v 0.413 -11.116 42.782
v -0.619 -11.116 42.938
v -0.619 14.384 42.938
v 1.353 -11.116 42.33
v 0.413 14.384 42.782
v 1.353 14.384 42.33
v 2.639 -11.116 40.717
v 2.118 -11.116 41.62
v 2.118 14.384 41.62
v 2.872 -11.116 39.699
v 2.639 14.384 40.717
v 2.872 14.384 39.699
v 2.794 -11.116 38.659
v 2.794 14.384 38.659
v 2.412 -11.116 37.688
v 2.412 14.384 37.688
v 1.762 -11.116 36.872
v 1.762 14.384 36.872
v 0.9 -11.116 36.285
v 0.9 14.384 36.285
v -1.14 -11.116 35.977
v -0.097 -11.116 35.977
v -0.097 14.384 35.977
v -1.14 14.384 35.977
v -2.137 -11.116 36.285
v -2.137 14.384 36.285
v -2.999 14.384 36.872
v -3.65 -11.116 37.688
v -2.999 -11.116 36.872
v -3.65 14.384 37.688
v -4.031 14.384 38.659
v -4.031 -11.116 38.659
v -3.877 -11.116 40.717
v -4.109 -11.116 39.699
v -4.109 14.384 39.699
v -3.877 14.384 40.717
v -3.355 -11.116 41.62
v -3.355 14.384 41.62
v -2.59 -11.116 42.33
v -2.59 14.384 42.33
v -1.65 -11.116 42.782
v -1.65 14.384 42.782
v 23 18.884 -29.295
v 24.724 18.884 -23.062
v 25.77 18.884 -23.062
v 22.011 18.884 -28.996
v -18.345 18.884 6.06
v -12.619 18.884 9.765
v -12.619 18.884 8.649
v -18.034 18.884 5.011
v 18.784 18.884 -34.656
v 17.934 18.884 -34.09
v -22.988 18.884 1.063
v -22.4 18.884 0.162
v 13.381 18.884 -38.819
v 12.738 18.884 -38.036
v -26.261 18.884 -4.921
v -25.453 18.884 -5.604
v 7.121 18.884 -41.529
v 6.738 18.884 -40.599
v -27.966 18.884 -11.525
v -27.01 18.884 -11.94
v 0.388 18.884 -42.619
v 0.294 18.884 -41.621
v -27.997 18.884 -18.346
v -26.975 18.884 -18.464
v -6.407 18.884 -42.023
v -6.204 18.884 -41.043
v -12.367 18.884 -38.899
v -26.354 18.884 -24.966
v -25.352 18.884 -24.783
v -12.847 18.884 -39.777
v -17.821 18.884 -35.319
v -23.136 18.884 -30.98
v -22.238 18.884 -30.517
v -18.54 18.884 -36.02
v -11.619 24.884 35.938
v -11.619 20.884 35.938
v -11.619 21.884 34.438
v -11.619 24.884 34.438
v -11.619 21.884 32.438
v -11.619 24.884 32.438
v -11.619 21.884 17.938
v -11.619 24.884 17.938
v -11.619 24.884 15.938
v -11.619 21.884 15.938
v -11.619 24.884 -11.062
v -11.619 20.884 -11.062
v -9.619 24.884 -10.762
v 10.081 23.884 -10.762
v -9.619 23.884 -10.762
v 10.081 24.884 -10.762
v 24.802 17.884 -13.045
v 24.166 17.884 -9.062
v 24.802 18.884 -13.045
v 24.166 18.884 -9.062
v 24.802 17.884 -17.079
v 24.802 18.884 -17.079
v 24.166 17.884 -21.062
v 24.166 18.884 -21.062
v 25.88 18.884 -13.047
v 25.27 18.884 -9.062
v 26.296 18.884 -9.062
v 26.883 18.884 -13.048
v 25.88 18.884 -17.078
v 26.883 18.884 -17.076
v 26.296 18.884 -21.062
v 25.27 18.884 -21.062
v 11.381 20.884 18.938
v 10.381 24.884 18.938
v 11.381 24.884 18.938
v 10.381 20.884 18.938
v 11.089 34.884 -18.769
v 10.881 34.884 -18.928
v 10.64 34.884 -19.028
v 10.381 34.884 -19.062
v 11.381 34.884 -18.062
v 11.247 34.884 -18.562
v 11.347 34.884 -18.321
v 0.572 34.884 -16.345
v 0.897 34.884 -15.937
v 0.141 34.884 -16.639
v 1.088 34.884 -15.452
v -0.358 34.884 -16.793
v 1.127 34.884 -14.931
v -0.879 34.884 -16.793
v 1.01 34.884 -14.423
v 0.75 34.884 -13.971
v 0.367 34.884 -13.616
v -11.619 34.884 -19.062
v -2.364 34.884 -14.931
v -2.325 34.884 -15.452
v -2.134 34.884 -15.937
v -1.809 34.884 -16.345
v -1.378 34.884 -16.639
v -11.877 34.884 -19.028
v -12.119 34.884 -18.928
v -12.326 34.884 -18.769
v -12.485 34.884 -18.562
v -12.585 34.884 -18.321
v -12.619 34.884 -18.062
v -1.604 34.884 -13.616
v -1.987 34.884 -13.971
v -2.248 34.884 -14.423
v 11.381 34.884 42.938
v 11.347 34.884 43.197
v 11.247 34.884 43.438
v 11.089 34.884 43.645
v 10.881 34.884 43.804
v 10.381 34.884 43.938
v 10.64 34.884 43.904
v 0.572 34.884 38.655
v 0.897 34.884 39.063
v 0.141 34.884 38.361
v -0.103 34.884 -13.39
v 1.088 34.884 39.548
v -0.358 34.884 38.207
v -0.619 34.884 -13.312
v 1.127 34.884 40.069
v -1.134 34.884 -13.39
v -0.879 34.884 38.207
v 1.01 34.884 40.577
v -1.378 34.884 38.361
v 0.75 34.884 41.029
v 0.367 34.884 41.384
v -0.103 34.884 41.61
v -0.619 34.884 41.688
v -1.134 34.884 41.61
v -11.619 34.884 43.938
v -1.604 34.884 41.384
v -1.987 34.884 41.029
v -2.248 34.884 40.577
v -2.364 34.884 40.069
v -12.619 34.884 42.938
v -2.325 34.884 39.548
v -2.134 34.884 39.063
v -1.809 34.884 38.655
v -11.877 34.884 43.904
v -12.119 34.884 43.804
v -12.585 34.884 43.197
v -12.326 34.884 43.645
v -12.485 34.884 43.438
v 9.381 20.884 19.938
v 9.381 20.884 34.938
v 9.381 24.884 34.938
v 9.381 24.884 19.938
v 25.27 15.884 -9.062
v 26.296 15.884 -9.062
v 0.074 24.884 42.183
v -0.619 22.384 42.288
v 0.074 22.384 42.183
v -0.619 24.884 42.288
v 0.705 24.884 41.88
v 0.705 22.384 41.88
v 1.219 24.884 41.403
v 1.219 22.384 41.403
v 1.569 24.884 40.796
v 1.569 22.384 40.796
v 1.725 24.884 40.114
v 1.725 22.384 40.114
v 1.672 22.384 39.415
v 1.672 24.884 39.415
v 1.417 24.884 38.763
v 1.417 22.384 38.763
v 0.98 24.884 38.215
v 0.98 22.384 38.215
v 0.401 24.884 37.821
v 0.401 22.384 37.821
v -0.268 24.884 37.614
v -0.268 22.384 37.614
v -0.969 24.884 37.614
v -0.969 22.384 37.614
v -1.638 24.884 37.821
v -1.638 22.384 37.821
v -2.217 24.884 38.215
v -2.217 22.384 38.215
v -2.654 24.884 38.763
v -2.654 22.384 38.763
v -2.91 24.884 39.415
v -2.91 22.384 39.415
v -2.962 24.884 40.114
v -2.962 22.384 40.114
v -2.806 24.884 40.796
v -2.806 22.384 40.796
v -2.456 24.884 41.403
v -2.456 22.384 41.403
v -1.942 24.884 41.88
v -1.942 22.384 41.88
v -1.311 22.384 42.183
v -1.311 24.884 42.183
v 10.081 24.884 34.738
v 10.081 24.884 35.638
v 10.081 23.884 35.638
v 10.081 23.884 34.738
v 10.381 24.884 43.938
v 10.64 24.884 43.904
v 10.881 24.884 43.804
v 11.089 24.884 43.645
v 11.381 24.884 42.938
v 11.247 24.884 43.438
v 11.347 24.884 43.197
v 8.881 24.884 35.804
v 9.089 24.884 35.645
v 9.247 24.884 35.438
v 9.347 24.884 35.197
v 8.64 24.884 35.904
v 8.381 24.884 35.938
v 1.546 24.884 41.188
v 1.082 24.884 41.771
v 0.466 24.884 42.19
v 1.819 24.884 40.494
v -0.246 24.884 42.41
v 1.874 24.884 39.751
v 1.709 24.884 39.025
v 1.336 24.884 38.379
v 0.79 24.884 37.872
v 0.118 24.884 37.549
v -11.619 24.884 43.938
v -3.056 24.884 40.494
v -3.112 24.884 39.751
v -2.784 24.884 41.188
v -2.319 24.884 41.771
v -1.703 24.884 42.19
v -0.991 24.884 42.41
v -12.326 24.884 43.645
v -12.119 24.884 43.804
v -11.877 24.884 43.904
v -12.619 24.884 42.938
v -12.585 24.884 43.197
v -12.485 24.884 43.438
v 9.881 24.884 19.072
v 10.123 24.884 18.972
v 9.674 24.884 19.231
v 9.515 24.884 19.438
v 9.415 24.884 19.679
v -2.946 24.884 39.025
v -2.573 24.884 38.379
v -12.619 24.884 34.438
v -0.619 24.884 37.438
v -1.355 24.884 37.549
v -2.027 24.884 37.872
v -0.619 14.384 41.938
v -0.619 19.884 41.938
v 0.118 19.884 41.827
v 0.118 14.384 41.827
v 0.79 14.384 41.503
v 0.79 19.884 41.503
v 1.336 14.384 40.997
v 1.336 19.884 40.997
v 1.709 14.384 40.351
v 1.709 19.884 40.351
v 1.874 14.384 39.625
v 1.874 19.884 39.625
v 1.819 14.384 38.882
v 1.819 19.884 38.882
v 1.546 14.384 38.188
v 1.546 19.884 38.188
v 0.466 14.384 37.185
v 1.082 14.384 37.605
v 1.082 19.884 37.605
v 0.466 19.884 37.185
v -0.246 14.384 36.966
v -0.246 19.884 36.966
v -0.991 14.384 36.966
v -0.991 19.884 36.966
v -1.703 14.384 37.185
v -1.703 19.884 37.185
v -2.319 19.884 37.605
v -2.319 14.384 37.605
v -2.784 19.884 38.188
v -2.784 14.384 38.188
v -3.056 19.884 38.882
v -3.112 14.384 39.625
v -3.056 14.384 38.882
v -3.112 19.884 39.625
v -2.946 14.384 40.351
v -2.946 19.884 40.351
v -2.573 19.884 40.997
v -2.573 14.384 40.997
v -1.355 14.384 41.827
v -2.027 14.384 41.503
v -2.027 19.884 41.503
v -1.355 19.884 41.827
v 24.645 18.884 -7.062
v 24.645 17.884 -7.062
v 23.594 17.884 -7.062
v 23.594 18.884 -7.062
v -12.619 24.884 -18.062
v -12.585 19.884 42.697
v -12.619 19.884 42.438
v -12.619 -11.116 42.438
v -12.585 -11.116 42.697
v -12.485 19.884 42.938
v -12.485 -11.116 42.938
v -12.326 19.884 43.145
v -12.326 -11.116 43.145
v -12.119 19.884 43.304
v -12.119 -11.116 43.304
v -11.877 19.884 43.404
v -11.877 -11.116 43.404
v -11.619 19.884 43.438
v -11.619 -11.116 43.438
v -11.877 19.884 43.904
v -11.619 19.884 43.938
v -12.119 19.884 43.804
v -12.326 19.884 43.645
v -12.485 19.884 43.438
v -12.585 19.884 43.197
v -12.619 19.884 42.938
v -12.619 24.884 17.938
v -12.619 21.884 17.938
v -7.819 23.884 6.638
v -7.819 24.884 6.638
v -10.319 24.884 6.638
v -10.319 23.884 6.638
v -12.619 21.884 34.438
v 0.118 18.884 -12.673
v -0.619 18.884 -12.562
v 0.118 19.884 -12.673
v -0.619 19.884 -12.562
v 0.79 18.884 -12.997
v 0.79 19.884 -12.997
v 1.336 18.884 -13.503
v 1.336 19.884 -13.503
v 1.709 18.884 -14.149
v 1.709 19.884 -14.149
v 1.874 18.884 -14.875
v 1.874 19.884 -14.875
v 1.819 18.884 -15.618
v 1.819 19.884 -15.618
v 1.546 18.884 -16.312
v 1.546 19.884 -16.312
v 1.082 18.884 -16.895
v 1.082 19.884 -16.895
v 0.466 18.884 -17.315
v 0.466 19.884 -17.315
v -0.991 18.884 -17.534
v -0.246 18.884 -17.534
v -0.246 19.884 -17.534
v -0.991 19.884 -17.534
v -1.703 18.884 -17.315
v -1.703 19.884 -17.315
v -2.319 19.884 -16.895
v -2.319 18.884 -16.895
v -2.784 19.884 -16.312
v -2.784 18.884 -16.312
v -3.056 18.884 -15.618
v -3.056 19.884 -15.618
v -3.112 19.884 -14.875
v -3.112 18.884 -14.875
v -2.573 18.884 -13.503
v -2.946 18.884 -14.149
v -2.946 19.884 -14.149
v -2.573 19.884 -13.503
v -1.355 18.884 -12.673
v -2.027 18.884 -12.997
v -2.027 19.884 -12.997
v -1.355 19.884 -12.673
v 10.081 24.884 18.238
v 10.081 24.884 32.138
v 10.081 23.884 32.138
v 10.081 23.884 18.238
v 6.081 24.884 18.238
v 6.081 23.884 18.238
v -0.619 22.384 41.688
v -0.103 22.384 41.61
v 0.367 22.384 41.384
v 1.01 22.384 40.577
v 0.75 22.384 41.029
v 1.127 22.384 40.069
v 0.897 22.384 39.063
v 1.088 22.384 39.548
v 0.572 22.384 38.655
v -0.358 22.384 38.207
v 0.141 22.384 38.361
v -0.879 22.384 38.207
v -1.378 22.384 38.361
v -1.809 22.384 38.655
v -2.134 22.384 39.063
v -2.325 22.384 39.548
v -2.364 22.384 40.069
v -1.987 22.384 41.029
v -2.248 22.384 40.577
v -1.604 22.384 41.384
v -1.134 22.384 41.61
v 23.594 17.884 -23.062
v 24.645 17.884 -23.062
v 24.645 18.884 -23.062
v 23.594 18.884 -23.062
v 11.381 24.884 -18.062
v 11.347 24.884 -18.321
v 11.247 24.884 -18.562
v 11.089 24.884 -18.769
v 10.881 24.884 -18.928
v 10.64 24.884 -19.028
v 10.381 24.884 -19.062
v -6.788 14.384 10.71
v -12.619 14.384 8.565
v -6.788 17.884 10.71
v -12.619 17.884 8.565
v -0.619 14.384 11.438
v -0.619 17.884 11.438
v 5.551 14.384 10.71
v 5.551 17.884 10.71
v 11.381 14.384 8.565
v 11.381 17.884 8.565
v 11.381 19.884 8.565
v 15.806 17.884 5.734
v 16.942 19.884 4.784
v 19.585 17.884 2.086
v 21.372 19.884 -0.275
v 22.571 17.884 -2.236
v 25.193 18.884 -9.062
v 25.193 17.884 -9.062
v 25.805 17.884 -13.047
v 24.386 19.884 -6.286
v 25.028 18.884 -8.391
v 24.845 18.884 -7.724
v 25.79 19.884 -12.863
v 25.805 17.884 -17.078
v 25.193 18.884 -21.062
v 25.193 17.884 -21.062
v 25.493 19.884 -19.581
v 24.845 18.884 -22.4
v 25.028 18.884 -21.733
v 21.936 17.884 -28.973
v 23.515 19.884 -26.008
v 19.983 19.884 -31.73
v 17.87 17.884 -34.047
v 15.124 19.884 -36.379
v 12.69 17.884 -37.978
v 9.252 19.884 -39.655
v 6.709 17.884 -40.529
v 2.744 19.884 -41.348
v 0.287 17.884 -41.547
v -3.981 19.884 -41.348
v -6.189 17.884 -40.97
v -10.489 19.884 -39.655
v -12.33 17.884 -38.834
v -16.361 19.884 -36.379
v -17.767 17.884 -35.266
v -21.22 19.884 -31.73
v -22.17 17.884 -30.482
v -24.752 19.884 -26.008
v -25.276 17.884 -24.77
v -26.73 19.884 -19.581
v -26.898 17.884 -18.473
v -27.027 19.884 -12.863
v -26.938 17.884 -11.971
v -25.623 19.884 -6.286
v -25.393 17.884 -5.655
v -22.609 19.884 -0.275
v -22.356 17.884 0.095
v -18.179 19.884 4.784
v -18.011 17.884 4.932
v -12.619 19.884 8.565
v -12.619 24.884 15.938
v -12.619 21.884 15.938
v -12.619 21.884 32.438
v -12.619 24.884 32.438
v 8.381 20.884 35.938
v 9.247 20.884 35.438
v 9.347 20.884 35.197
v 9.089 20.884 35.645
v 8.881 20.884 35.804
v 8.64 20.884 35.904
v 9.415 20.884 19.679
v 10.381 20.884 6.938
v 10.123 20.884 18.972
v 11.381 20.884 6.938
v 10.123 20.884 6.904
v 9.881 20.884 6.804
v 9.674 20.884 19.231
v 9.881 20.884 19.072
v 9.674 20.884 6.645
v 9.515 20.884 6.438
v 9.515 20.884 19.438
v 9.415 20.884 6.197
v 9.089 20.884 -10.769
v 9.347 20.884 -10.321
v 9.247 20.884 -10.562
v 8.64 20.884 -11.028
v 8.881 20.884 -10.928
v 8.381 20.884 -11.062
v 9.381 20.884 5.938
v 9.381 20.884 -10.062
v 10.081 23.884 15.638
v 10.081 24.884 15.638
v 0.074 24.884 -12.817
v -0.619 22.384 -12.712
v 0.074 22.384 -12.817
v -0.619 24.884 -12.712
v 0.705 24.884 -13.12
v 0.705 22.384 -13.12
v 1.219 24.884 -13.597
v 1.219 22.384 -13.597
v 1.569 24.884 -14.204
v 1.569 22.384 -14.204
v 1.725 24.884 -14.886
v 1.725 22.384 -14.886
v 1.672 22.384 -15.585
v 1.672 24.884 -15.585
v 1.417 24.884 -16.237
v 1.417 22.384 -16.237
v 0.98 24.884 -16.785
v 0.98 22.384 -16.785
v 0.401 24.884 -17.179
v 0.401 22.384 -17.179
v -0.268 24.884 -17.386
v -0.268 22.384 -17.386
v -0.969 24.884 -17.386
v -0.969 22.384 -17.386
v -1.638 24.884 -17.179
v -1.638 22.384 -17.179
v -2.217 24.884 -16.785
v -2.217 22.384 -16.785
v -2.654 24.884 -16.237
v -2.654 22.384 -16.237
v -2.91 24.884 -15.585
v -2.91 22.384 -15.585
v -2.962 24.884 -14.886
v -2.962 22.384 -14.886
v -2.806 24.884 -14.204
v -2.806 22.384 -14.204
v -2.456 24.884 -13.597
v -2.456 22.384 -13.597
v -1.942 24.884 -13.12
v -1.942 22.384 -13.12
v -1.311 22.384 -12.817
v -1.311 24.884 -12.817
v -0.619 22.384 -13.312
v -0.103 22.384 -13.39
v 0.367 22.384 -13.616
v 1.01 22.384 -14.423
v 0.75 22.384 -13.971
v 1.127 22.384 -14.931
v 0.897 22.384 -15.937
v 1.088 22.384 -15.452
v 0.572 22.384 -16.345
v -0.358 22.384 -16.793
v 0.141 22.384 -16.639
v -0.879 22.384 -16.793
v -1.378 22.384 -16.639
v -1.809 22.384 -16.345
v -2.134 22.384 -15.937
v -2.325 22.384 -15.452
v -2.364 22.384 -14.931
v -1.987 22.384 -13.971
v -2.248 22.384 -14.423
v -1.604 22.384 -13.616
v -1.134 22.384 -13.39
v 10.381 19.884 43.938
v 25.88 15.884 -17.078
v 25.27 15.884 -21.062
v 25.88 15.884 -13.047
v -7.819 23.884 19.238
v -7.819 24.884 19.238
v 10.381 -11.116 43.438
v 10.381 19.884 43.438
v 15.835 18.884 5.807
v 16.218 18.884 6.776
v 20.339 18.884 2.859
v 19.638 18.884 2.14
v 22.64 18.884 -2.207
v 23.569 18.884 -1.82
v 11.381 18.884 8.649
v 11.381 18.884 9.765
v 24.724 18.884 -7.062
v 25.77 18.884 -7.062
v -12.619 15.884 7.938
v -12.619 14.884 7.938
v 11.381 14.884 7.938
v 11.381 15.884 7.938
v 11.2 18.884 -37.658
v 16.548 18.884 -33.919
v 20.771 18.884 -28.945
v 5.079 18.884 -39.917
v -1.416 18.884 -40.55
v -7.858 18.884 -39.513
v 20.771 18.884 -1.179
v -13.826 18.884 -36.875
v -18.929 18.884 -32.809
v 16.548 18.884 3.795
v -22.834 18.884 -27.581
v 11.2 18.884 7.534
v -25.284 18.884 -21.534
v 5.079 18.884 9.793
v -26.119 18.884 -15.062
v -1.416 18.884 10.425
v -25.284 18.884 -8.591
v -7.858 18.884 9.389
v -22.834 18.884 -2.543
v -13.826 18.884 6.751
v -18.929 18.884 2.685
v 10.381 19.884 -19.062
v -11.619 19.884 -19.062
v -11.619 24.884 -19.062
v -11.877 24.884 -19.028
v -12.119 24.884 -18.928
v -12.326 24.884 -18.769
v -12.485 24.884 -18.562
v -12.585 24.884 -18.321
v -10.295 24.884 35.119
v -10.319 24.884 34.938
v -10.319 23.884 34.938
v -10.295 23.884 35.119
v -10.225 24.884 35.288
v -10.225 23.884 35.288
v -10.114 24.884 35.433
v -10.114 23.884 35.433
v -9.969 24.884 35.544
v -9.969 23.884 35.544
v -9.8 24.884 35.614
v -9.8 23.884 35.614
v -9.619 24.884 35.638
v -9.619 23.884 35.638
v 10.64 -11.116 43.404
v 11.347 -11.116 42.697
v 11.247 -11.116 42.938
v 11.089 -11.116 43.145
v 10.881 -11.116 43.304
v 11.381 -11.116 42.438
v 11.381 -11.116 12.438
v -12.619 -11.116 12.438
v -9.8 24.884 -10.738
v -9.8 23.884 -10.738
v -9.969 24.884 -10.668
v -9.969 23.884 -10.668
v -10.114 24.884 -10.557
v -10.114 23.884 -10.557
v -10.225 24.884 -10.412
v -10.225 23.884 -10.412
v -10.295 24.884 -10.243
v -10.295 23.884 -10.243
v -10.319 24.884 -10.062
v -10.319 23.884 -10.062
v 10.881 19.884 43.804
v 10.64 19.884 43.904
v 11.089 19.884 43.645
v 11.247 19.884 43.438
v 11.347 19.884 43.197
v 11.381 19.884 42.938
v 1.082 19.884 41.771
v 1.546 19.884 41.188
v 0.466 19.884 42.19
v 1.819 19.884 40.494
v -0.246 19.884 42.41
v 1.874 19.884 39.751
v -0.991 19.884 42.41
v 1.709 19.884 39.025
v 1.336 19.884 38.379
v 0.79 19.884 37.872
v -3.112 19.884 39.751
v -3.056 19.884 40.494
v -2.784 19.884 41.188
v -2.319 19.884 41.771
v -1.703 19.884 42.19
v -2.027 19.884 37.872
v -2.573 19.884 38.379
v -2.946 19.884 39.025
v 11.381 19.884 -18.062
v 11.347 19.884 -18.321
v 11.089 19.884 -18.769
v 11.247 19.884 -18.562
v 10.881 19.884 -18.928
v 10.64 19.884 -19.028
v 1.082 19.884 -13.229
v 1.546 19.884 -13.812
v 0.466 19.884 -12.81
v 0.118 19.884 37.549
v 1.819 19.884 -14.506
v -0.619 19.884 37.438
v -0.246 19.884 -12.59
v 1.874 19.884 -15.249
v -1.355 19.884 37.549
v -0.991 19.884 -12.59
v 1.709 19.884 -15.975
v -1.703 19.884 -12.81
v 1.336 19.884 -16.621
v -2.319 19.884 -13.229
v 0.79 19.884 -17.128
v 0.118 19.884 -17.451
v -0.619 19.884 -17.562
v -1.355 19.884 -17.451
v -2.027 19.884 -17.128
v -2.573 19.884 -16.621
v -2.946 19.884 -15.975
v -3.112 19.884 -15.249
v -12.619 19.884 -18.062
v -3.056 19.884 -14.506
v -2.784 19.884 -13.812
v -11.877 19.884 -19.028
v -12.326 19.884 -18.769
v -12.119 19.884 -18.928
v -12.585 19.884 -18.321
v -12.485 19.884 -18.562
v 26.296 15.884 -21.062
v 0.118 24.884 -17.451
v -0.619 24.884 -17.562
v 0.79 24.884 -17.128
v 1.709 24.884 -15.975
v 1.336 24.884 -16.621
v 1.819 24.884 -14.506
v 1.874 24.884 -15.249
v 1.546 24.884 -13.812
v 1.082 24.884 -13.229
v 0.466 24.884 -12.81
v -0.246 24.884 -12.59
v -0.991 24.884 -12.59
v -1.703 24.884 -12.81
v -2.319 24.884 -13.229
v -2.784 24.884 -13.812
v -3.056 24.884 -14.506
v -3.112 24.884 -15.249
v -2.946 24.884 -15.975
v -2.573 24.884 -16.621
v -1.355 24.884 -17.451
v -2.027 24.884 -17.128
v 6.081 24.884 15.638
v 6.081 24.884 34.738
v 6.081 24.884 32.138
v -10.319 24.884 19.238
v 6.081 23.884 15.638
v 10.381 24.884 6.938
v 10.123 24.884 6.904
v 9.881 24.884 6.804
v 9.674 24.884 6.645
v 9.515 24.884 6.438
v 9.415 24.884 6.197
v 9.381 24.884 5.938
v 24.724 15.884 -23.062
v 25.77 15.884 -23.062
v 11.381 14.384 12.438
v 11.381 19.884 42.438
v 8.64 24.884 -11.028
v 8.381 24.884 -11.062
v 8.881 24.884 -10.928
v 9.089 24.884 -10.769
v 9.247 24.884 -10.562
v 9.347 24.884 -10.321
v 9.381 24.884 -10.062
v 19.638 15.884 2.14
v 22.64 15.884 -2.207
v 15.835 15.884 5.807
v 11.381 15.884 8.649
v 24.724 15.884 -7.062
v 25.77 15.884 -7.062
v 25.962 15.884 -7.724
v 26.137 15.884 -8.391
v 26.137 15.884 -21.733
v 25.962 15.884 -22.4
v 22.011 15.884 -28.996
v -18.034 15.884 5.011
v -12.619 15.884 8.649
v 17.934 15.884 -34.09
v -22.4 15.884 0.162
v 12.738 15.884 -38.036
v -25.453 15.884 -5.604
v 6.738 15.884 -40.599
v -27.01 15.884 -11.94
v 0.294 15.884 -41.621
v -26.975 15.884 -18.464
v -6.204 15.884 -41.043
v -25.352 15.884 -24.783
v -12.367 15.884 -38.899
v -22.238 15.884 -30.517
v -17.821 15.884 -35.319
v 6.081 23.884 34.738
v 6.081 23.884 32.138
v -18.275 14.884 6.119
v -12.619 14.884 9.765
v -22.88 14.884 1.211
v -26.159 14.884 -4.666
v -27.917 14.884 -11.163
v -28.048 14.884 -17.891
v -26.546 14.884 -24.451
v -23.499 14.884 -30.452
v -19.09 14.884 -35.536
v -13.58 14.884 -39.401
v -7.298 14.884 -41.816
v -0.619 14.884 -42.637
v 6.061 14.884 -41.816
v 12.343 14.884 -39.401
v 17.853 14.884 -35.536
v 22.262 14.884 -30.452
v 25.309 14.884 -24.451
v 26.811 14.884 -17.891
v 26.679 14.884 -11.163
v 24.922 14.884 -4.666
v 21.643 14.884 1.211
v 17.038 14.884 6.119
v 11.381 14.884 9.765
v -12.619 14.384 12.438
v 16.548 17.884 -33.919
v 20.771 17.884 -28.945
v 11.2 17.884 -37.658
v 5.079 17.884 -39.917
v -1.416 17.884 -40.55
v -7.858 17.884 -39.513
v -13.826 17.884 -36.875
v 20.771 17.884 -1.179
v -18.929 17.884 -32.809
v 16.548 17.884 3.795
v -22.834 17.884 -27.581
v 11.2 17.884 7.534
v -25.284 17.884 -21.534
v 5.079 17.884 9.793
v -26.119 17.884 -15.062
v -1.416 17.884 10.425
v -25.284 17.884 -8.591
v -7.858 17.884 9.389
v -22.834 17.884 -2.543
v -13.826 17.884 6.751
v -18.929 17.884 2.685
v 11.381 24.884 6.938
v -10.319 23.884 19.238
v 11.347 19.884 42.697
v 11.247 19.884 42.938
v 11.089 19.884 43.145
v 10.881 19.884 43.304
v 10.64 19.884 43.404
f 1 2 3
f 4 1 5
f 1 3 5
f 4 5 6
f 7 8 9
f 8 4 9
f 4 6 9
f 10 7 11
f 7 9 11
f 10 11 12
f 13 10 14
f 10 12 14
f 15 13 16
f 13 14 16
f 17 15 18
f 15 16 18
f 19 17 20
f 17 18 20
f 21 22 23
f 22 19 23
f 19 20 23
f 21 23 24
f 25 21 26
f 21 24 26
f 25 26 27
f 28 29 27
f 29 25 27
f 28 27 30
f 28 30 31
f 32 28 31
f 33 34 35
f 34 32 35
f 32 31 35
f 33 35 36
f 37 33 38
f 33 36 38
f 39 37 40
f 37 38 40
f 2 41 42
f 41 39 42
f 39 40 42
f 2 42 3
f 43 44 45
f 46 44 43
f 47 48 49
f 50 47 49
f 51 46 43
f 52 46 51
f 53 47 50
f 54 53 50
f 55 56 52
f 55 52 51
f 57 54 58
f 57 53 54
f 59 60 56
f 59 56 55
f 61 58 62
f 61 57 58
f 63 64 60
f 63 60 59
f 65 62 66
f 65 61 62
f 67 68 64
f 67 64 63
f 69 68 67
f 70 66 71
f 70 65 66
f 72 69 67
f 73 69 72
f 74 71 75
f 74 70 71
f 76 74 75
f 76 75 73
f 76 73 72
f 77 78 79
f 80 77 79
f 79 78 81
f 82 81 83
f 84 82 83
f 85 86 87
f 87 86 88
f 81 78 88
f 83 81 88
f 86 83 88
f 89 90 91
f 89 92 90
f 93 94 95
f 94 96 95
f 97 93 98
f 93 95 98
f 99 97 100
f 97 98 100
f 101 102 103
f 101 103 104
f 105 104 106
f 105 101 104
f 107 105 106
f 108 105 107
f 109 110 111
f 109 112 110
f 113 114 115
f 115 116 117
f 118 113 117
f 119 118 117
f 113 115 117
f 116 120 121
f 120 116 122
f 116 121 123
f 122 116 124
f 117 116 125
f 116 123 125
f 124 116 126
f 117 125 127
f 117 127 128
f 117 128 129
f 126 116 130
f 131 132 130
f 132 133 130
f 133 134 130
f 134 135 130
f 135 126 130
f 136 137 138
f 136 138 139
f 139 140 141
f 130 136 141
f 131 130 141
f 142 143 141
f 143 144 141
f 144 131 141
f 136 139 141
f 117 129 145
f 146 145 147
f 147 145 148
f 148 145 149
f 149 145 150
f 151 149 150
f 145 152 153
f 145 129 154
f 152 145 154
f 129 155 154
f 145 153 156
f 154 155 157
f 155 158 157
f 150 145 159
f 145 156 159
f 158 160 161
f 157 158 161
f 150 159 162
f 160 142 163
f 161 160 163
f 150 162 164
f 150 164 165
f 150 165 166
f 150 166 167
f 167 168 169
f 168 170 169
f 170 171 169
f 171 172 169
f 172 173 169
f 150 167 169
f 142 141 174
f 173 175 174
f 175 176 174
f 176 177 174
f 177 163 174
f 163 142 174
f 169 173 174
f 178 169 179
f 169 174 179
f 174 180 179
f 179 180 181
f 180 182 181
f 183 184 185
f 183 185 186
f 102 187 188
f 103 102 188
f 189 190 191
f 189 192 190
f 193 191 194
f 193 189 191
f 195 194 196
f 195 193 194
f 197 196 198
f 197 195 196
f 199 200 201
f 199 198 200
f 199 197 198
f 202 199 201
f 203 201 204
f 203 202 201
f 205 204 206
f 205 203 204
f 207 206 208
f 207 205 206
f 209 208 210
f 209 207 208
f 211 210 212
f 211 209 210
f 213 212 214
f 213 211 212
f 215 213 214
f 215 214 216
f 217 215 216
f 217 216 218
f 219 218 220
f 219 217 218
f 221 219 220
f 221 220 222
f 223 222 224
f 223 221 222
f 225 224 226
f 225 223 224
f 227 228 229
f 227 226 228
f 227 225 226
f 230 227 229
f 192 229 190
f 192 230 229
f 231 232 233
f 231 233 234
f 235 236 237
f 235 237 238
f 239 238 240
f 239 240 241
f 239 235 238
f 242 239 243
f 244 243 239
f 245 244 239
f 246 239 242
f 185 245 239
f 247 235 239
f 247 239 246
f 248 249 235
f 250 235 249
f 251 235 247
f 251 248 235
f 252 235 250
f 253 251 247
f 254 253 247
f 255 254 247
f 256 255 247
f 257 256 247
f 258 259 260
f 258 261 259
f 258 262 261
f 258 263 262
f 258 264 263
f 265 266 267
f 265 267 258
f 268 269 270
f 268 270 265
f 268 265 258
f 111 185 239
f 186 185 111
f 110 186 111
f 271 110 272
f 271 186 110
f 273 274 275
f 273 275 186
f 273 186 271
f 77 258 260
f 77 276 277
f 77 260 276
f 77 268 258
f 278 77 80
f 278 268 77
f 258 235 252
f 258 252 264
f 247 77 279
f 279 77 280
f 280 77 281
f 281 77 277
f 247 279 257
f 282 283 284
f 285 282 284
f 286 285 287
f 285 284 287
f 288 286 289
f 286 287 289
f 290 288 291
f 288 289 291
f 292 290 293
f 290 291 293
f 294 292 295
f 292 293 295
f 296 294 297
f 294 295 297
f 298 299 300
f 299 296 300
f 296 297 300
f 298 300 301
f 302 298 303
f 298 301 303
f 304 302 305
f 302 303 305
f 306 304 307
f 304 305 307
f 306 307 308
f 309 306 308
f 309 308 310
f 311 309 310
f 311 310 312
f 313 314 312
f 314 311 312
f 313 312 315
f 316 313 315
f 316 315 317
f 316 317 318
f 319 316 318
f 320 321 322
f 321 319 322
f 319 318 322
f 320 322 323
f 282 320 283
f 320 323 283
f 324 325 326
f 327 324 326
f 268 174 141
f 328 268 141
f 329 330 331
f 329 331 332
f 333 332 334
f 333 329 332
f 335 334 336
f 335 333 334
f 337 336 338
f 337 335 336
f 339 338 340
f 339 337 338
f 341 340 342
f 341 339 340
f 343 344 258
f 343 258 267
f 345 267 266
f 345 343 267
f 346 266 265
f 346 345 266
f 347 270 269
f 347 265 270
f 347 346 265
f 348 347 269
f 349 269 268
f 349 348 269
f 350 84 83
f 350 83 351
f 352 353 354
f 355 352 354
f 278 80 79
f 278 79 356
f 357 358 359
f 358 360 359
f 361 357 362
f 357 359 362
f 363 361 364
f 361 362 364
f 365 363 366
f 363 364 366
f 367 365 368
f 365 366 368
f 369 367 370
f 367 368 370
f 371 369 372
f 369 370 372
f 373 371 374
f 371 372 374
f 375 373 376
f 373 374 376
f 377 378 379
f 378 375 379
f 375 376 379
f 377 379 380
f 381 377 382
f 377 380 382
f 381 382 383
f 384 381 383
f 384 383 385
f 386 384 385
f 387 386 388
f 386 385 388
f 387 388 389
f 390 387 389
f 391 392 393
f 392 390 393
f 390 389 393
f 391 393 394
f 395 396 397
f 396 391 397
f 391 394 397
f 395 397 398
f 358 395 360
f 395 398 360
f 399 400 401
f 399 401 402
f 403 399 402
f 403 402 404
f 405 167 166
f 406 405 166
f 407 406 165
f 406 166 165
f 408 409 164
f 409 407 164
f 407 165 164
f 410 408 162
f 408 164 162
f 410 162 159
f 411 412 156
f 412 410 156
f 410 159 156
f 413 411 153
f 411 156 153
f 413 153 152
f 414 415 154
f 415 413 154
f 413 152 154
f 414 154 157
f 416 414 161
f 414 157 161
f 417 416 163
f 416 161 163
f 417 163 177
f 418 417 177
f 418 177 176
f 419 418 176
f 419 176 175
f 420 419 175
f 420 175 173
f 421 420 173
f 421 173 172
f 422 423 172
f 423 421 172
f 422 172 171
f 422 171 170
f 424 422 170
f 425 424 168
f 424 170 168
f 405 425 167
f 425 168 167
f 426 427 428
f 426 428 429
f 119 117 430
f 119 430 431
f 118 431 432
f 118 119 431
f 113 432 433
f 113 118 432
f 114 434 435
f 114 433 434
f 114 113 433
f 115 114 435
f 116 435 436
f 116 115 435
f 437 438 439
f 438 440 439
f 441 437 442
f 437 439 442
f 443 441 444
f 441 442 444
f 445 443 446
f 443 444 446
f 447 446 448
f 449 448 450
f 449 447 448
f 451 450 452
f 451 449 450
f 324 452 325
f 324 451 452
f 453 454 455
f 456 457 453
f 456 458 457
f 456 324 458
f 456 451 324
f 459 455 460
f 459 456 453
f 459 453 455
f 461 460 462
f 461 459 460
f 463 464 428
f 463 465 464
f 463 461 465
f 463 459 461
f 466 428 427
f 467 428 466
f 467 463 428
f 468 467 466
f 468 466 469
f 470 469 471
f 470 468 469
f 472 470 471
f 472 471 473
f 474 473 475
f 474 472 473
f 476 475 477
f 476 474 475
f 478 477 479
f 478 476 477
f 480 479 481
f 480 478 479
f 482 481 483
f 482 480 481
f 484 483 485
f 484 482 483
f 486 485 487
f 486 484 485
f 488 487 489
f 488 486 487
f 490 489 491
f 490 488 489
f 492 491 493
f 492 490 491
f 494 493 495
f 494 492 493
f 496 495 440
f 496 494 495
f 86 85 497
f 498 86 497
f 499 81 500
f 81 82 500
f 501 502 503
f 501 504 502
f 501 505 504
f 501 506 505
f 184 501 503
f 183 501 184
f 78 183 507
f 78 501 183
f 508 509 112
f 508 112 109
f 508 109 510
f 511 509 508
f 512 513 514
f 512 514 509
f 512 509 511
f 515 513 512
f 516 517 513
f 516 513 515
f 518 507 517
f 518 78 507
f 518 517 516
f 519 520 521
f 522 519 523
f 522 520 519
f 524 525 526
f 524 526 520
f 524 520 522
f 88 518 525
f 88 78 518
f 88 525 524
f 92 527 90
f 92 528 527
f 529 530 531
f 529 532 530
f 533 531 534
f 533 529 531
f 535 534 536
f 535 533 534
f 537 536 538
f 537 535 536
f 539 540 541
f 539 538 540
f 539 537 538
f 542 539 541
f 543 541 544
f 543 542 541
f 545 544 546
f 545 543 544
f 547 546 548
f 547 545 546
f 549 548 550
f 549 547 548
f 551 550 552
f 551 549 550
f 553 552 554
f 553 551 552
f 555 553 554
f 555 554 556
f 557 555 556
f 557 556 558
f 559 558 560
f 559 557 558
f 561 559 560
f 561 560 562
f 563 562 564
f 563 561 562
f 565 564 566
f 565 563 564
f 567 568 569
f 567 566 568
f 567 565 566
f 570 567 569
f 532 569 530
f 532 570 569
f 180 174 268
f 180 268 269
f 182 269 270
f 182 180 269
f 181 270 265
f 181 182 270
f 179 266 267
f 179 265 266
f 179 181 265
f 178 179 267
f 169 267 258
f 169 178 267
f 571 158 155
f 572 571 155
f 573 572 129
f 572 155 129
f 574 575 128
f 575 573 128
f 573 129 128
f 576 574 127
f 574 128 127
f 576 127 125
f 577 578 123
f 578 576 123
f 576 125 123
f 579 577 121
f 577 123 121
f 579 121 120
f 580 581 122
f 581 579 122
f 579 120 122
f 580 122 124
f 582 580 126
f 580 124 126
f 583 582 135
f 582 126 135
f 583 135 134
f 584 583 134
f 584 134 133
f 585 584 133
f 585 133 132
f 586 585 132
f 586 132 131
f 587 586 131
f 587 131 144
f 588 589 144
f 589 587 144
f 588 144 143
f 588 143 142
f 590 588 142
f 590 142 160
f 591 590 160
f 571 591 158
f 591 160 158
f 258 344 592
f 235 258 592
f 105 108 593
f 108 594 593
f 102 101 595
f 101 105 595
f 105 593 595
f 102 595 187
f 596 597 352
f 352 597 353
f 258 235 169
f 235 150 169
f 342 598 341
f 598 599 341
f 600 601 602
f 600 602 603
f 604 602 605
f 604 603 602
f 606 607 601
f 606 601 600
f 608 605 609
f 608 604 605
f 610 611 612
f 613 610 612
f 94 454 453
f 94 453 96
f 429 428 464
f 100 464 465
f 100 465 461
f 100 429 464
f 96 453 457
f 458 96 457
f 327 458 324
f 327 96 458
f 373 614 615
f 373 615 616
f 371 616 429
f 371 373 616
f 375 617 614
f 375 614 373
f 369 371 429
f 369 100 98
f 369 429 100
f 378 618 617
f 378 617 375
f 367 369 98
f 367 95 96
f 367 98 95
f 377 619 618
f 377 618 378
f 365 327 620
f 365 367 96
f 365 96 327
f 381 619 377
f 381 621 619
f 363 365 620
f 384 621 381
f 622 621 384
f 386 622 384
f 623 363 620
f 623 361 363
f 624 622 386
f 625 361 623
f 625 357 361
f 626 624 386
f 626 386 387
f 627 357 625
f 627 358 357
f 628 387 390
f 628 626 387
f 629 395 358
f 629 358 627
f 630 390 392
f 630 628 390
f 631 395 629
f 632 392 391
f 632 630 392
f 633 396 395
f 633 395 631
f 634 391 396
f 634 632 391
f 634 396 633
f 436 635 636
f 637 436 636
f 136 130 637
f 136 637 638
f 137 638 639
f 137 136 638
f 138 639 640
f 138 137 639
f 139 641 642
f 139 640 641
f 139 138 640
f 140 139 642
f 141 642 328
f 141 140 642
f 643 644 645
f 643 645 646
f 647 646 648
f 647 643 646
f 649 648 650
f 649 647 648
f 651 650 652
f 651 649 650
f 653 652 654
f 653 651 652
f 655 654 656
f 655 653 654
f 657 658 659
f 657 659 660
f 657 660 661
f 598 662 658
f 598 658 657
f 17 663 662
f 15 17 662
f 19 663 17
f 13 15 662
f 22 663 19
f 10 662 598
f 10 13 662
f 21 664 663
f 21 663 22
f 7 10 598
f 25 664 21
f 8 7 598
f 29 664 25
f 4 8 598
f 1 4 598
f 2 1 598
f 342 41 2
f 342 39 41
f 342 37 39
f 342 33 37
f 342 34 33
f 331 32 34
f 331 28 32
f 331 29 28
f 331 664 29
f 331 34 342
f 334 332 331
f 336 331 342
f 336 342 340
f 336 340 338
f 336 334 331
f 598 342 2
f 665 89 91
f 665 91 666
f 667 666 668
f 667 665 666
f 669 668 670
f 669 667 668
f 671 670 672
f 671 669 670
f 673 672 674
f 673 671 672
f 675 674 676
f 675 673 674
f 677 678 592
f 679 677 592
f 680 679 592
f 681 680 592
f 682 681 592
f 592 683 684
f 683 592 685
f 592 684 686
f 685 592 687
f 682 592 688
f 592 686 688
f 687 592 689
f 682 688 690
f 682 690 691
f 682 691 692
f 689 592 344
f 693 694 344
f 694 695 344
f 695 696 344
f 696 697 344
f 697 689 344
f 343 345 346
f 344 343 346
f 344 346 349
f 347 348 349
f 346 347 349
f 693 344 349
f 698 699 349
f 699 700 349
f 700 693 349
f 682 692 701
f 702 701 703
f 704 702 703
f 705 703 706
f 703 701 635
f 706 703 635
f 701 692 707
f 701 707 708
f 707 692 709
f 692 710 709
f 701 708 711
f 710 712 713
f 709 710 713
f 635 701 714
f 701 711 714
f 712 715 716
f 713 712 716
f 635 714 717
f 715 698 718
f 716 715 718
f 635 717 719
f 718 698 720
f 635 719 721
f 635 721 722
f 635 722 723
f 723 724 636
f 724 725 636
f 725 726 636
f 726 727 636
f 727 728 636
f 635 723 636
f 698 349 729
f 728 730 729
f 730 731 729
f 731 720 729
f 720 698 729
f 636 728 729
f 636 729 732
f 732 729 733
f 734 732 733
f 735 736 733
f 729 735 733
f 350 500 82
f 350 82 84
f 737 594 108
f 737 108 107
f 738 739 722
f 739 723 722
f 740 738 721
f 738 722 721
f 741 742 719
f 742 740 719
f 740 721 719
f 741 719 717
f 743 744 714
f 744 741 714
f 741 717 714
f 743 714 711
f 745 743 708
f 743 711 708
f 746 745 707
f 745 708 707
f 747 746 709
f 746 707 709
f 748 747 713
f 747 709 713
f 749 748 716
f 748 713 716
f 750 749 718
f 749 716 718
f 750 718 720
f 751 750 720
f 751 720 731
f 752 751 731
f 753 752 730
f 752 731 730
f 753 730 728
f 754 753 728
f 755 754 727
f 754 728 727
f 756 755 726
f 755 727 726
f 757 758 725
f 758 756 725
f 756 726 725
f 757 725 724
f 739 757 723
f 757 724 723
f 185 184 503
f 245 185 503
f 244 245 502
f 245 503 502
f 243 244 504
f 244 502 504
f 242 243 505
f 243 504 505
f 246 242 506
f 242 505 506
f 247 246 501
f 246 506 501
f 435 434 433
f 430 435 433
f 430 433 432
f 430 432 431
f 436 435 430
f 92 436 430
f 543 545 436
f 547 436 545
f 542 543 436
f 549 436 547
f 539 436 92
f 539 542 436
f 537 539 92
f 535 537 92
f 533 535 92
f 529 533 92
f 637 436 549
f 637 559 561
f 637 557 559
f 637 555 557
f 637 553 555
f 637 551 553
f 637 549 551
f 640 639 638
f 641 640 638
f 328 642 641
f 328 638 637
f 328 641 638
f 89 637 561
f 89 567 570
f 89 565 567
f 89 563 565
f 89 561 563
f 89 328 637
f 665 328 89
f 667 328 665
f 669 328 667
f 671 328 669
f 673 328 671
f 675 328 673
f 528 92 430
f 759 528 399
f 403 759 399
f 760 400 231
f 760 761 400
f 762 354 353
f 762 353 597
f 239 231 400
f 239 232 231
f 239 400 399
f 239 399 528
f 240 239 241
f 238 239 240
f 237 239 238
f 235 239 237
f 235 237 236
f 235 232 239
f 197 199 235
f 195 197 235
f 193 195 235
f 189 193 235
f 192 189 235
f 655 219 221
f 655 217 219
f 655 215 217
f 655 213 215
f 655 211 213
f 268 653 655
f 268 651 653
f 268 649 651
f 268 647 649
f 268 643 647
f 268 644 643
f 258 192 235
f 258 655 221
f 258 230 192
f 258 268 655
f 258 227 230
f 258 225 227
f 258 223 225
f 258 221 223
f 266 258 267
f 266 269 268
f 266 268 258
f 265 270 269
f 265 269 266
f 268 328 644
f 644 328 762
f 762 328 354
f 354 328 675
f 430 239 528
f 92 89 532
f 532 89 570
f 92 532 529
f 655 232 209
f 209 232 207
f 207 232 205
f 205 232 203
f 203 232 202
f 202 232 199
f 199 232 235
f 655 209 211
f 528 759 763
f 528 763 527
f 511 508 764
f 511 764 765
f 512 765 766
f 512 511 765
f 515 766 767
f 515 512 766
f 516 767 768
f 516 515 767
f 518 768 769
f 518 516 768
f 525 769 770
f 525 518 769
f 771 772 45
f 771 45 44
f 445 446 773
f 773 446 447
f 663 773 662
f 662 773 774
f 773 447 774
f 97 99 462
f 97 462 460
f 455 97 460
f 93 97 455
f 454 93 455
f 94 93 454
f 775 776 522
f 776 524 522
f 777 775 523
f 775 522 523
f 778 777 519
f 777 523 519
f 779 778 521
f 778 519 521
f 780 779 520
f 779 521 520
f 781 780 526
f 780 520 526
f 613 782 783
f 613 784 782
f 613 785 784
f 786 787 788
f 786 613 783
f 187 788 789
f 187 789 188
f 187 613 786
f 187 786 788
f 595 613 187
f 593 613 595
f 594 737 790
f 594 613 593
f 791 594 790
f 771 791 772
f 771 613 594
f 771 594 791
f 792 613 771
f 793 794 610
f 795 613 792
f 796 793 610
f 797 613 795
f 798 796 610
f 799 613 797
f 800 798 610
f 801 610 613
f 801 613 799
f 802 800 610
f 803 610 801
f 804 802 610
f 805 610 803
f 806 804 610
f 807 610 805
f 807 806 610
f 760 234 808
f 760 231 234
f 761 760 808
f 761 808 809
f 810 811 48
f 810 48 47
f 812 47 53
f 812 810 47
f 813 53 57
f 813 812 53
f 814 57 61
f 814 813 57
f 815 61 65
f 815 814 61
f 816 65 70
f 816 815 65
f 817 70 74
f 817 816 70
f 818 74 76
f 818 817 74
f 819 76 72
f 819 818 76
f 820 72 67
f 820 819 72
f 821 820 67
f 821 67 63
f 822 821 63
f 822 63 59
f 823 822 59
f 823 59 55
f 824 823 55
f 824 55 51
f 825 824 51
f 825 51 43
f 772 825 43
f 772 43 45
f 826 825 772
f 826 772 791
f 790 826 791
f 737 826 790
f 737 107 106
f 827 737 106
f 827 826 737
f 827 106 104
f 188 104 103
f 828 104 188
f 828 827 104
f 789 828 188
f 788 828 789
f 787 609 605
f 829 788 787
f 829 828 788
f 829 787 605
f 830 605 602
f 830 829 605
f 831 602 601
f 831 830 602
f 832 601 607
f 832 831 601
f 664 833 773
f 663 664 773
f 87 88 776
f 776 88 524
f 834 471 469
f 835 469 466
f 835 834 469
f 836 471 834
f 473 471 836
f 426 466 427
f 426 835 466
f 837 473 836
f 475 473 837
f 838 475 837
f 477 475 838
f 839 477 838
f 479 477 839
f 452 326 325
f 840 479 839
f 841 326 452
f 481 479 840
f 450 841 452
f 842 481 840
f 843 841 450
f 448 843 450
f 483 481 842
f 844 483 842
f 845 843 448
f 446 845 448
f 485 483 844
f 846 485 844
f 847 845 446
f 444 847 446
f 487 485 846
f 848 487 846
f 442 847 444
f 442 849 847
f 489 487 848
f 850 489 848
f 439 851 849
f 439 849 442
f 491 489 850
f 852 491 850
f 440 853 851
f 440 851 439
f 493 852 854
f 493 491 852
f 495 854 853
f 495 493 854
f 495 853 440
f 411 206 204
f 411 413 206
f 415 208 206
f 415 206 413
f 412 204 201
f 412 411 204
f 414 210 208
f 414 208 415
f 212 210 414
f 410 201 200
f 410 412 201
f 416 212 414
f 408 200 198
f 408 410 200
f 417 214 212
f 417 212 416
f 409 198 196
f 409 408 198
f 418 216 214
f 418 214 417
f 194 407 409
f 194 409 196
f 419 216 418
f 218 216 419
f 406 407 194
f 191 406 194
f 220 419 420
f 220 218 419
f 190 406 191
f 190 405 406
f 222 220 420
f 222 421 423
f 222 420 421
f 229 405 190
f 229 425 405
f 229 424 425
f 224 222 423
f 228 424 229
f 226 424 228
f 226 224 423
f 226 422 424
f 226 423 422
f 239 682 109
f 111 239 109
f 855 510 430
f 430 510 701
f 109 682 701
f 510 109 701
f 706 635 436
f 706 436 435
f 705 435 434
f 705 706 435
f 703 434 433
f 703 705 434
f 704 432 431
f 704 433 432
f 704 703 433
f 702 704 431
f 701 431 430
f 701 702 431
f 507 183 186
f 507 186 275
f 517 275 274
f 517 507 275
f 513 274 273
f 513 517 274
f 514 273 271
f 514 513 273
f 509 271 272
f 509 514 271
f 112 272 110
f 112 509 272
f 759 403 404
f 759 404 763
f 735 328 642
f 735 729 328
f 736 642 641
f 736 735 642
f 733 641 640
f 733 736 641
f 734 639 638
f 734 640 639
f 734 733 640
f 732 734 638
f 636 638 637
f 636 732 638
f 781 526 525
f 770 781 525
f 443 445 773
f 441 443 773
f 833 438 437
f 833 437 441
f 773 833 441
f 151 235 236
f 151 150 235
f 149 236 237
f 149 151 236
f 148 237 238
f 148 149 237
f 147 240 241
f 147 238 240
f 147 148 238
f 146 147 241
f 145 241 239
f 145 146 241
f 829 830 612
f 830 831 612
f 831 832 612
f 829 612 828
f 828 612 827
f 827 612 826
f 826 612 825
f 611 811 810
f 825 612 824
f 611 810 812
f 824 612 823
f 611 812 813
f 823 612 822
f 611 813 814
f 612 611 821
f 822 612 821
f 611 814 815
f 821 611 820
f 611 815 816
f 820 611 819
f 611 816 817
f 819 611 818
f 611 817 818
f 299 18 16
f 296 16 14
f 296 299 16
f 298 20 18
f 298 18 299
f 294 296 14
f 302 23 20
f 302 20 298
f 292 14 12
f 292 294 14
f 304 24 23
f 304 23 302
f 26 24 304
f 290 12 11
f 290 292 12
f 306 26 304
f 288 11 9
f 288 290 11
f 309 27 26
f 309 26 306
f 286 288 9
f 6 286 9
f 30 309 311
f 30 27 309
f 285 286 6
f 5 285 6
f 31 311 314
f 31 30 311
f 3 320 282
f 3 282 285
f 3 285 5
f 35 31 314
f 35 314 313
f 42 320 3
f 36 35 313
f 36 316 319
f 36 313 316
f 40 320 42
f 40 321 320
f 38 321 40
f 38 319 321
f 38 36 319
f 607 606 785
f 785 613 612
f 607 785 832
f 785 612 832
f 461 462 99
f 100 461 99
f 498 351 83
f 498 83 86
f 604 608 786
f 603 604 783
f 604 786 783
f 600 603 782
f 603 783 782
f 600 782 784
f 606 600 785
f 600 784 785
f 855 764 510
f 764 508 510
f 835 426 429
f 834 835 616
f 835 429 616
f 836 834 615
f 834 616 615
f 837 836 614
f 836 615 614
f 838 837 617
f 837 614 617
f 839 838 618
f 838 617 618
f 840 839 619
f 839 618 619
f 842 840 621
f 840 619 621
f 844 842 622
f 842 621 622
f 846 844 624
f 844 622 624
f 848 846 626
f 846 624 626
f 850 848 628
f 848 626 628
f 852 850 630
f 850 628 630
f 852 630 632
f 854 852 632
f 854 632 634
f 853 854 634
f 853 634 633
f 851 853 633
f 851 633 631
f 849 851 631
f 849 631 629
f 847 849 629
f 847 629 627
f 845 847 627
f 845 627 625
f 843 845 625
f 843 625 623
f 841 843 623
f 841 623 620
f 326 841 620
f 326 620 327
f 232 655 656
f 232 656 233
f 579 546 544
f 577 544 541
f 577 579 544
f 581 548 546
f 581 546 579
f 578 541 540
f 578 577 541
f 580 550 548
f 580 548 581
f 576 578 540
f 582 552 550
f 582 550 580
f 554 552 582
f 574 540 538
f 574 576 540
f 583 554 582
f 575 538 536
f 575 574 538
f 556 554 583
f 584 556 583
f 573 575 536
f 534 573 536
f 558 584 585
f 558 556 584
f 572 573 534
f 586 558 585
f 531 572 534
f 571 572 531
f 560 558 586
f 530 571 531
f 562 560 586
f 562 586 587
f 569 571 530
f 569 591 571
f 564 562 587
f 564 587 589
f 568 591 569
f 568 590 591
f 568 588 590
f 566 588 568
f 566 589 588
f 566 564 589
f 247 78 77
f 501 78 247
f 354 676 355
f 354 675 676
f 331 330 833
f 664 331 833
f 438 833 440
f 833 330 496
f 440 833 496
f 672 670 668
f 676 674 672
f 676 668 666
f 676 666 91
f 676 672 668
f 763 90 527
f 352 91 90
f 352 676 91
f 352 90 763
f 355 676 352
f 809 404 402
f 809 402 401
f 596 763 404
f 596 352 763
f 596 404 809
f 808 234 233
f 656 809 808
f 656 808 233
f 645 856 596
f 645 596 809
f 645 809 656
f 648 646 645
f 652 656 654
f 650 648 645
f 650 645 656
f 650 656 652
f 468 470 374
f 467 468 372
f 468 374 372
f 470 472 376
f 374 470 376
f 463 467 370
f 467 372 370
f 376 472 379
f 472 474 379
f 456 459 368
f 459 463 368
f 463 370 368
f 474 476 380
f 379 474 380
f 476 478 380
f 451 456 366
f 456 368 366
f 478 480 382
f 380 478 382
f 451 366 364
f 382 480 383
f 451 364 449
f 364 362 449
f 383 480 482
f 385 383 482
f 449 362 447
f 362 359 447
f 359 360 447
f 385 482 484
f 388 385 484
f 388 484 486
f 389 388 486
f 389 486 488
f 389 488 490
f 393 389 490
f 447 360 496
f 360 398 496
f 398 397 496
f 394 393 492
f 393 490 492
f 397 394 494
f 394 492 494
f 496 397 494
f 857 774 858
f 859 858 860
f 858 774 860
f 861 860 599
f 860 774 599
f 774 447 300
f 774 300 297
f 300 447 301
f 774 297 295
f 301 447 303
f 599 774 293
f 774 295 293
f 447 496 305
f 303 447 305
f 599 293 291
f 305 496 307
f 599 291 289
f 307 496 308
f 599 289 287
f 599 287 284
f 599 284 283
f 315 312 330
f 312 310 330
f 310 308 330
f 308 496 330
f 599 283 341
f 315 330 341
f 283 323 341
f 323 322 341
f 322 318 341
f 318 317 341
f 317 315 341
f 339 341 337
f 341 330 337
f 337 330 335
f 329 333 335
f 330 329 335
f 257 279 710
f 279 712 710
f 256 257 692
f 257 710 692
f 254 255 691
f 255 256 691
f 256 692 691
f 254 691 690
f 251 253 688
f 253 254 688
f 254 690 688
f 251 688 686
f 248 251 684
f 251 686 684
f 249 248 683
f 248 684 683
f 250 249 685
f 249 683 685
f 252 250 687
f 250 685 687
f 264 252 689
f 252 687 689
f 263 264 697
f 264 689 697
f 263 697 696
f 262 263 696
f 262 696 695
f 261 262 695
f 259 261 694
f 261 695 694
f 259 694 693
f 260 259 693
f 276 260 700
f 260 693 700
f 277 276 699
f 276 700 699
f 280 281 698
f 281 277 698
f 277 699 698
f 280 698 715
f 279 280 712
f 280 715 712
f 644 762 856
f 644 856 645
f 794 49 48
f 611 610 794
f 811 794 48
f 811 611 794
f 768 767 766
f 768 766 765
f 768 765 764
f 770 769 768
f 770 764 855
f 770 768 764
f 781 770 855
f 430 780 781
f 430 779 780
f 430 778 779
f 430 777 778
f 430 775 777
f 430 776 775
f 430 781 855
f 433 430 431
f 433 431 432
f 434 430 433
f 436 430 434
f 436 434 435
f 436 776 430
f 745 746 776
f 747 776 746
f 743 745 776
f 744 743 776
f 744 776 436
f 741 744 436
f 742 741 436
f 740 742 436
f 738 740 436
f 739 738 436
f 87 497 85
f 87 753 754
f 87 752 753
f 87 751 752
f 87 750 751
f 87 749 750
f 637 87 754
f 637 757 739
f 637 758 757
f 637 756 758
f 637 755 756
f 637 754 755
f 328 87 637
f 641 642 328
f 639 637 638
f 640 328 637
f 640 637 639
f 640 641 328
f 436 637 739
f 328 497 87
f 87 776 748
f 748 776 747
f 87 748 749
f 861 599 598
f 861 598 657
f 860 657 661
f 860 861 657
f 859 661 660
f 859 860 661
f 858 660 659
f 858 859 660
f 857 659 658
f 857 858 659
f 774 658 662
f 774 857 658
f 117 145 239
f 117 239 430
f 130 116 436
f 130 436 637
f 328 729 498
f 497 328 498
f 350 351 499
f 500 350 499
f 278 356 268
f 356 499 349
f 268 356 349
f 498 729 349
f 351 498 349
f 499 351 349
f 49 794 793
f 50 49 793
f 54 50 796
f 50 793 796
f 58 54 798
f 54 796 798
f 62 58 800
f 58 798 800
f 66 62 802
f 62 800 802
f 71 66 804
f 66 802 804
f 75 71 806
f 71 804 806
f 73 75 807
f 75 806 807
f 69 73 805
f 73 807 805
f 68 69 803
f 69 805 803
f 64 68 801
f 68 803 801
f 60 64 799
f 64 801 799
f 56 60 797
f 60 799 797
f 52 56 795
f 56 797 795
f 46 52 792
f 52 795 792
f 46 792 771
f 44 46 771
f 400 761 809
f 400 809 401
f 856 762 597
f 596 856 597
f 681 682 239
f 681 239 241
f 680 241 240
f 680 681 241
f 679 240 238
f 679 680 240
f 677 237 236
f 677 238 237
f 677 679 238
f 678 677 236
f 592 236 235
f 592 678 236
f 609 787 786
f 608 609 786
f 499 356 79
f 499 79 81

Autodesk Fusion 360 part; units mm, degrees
sketch "Bottom" plane through (0, 0, 0) normal (0, 0, 1) x (1, 0, 0) in component "Coil Case"
  arc A0 (33.9349, 0) -> (34.9349, 1) centre (33.9349, 1) ccw
  arc A1 (34.9349, 23) -> (33.9349, 24) centre (33.9349, 23) ccw
  line L0 (3.9349, 24) -> (3.9349, 0)
  circle A2 centre (30.9349, 12) radius 3.5
  circle A3 centre (30.9349, 12) radius 2.5
  line L1 (0, 0) -> (33.9349, 0)
  line L2 (34.9349, 1) -> (34.9349, 23)
  line L3 (33.9349, 24) -> (0, 24)
  line L4 (30.9349, 12) -> (34.9349, 12) construction
  line L5 (0, 0) -> (0, 24) construction
  circle A4 centre (-23.5651, 12) radius 26.5
  line L6 (0, 12) -> (-23.5651, 12) construction
  circle A5 centre (-23.5651, 12) radius 25.5
  circle A6 centre (-23.5651, 12) radius 2.5
  line L7 (-23.5651, 12) -> (-23.5651, -14.5) construction
  line L8 (-17.5651, -13.8118) -> (-17.5651, -12.7841)
  line L9 (-15.5651, -13.2636) -> (-15.5651, -12.2126)
  line L10 (-29.5651, -13.8118) -> (-29.5651, -12.7841)
  line L11 (-31.5651, -13.2636) -> (-31.5651, -12.2126)
  dimension "d2" = 7
  dimension "d4" = 33.9349
  dimension "d6" = 5
  dimension "d8" = 4
  dimension "d9" = 22
  dimension "d10" = 1
  dimension "d11" = 1
  dimension "d21" = 12
  dimension "d22" = 33.9349
  dimension "d23" = 3.9349
  dimension "d27" = 53
  dimension "d28" = 23.5651
  dimension "d29" = 51
  dimension "d30" = 5
  dimension "d37" = 2
  dimension "d38" = 6
  dimension "d24" = 0
  dimension "d25" = 0
  dimension "d26" = 0
  dimension "d35" = 0
extrude "Extrude1" add sketch "Bottom" along normal blind 5.5 contours A0 A1 L0 L1 L2 L3 | L0 L1 L3 A4 | A2 makes body 1 in component "Coil Case"
extrude "Extrude2" add sketch "Bottom" along normal blind 25.5 from surface at 5.5 contours A0 A1 L0 L1 L2 L3 bodies 1 in component "Coil Case"
sketch "Side" plane through (34.9349, 0, 0) normal (1, 0, 0) x (0, 1, 0) in component "Coil Case"
  line L0 (1, 0) -> (23, 0)
  line L1 (23, 0) -> (23, 31)
  line L2 (23, 31) -> (1, 31)
  line L3 (1, 31) -> (1, 0)
  line L4 (12, 0) -> (12, 17) construction
  line L5 (12, 17) -> (12, 26.5) construction
  circle A0 centre (12, 26.5) radius 9.5
  dimension "d17" = 17
  dimension "d18" = 9.5
extrude "Extrude3" cut sketch "Side" against normal blind 31 contours L2 A0 picked at (11.7728, 32.6585) bodies 1 in component "Coil Case"
extrude "Extrude4" add sketch "Bottom" along normal blind 1 contours A4 A5 L9 L11 | A4 A5 L8 L9 | A4 A5 L10 L11 | A4 A5 L8 L10 | A5 bodies 1 in component "Coil Case"
extrude "Extrude5" add sketch "Bottom" along normal blind 2 contours A4 A5 L9 L11 | A4 A5 L8 L9 | A4 A5 L10 L11 | A4 A5 L8 L10 bodies 1 in component "Coil Case"
extrude "Extrude6" cut sketch "Bottom" against normal up to surface (1 mm away) from surface at 2 contours A4 A5 L8 L9 | A4 A5 L10 L11 bodies 1 in component "Coil Case"
sketch "Bottom (2)" plane through (0, 0, 0) normal (0, 1, 0) x (-1, 0, 0) in component "Coil Top"
  circle A0 centre (0, 0) radius 26.575
  circle A1 centre (0, 0) radius 27.575
  line L0 (6, -25.8888) -> (6, -26.9143)
  line L1 (8, -26.389) -> (8, -25.3423)
  line L2 (0, 0) -> (0, -27.575) construction
  line L3 (-6, -25.8888) -> (-6, -26.9143)
  line L4 (-8, -26.389) -> (-8, -25.3423)
  line L5 (0, 0) -> (0, 27.575) construction
  line L6 (0, 0) -> (-27.575, 0) construction
  line L7 (-23, 0) -> (-23, 12)
  line L8 (-23, 12) -> (-24.827, 12)
  line L9 (-23, 0) -> (-23, -12)
  line L10 (-23, -12) -> (-24.827, -12)
  dimension "d17_1" = 53.15
  dimension "d18_1" = 55.15
  dimension "d29_1" = 6
  dimension "d30_1" = 2
  dimension "d1" = 0
  dimension "d3" = 0
  dimension "d5" = 0
  dimension "d7" = 0
  dimension "d47" = 12
  dimension "d48" = 12
extrude "Extrude4'" add sketch "Bottom (2)" along normal blind 1 separate body contours A0 L7 L8 L9 L10 | A0 A1 L4 L10 | A0 A1 L3 L4 | A0 A1 L0 L3 | A0 A1 L0 L1 | A0 A1 L1 L8 picked at (9.9525, 1.3107) makes body 2 in component "Coil Top"
extrude "Extrude5'" add sketch "Bottom (2)" along normal blind 4 contours A0 A1 L4 L10 | A0 A1 L0 L3 | A0 A1 L1 L8 bodies 2 in component "Coil Top"
sketch "Bottom (3)" plane through (0, 0, 0) normal (0, 1, 0) x (-1, 0, 0) in component "PCB Top"
  arc A0 (-1, -24) -> (0, -23) centre (-1, -23) ccw
  line L0 (0, -23) -> (0, -1)
  arc A1 (0, -1) -> (-1, 0) centre (-1, -1) ccw
  line L1 (-63, -23) -> (-63, -1)
  line L2 (0, -1) -> (0, -23)
  arc A2 (-1, -24) -> (0, -23) centre (-1, -23) ccw
  arc A3 (-63, -23) -> (-62, -24) centre (-62, -23) ccw
  arc A4 (-62, 0) -> (-63, -1) centre (-62, -1) ccw
  arc A5 (0, -1) -> (-1, 0) centre (-1, -1) ccw
  circle A6 centre (-59, -12) radius 2.35
  circle A7 centre (-59, -12) radius 1.75
  circle A8 centre (-4, -12) radius 2.35
  circle A9 centre (-4, -12) radius 1.75
  line L3 (-1, -24) -> (-62, -24)
  line L4 (-9.2, -22.7) -> (-9.2, -18.7)
  line L5 (-9.2, -18.7) -> (-11.8, -18.7)
  line L6 (-11.8, -18.7) -> (-11.8, -22.7)
  line L7 (-11.8, -22.7) -> (-25.7, -22.7)
  line L8 (-25.7, -22.7) -> (-25.7, -22.5907)
  line L9 (-25.7, -22.5907) -> (-25.7, -18.7)
  line L10 (-25.7, -18.7) -> (-28.3, -18.7)
  line L11 (-28.3, -18.7) -> (-28.3, -22.7)
  line L12 (-28.3, -22.7) -> (-54.7, -22.7)
  line L13 (-54.7, -22.7) -> (-54.7, -3)
  arc A10 (-54, -2.3) -> (-54.7, -3) centre (-54, -3) ccw
  line L14 (-54, -2.3) -> (-37.3, -2.3)
  line L15 (-37.3, -4.8) -> (-37.3, -2.3)
  line L16 (-24.7, -4.8) -> (-37.3, -4.8)
  line L17 (-24.7, -2.3) -> (-24.7, -4.8)
  line L18 (-24.7, -2.3) -> (-9, -2.3)
  arc A11 (-8.3, -3) -> (-9, -2.3) centre (-9, -3) ccw
  line L19 (-8.3, -3) -> (-8.3, -22.7)
  line L20 (-8.3, -22.7) -> (-9.2, -22.7)
  line L21 (-4, -12) -> (0, -12) construction
  line L22 (-4, -12) -> (-4, 0) construction
  line L23 (-59, -12) -> (-59, 0) construction
  line L24 (-59, -12) -> (-63, -12) construction
  line L25 (-1, 0) -> (-62, 0)
  line L26 (0, 0) -> (-1, 0) construction
  line L27 (0, 0) -> (0, -1) construction
  dimension "d55_1" = 1
  dimension "d61" = 4.7
  dimension "d62" = 3.5
  dimension "d64" = 4.7
  dimension "d65" = 3.5
  dimension "d80" = 12
  dimension "d81" = 4
  dimension "d82" = 61
  dimension "d84" = 22
  dimension "d85" = 12
  dimension "d86" = 4
  dimension "d87" = 61
  dimension "d88" = 1
  dimension "d89" = 2.3
  dimension "d90" = 2.5
  dimension "d91" = 12.6
  dimension "d92" = 2.5
  dimension "d93" = 16.7
  dimension "d94" = 19.7
  dimension "d95" = 0.9
  dimension "d96" = 2.6
  dimension "d97" = 4
  dimension "d98" = 4
  dimension "d99" = 13.9
  dimension "d100" = 3.8907
  dimension "d101" = 2.6
  dimension "d102" = 4
  dimension "d103" = 26.4
  dimension "d104" = 19.7
  dimension "d105" = 0.7
  dimension "d106" = 8.3
extrude "Extrude15" add sketch "Bottom (3)" along normal blind 10 separate body contours A0 L0 A1 L1 L2 A2 A3 A4 A5 L3 L25 | A6 | A8 | L4 L5 L6 L7 L8 L9 L10 L11 L12 L13 A10 L14 L15 L16 L17 L18 A11 L19 L20 makes body 3 in component "PCB Top"
extrude "Extrude16" add sketch "Bottom (3)" along normal blind 1 from surface at 10 contours L4 L5 L6 L7 L8 L9 L10 L11 L12 L13 A10 L14 L15 L16 L17 L18 A11 L19 L20 bodies 3 in component "PCB Top"
extrude "Extrude17" add sketch "Bottom (3)" along normal blind 2.5 from surface at 10 contours A6 | A8 bodies 3 in component "PCB Top"
sketch "Bottom (4)" plane through (0, 0, 0) normal (0, 1, 0) x (1, 0, 0) in component "PCB Bottom"
  line L0 (63, 1) -> (63, 23)
  arc A0 (63, 23) -> (62, 24) centre (62, 23) ccw
  arc A1 (62, 0) -> (63, 1) centre (62, 1) ccw
  line L1 (1, 0) -> (62, 0)
  line L2 (8, 23) -> (55, 23)
  circle A2 centre (59, 12) radius 2.5
  line L3 (62, 24) -> (1, 24)
  line L4 (0, 23) -> (0, 1)
  arc A3 (1, 24) -> (0, 23) centre (1, 23) ccw
  arc A4 (0, 1) -> (1, 0) centre (1, 1) ccw
  circle A5 centre (4, 12) radius 2.5
  line L5 (8, 23) -> (8, 3)
  line L6 (55, 23) -> (55, 3)
  line L7 (9, 2) -> (24, 2)
  line L8 (54, 2) -> (54, 2)
  line L9 (54, 2) -> (38, 2)
  line L10 (25, 1) -> (25, 0)
  line L11 (37, 1) -> (37, 0)
  arc A6 (8, 3) -> (9, 2) centre (9, 3) ccw
  arc A7 (25, 1) -> (24, 2) centre (24, 1) ccw
  arc A8 (38, 2) -> (37, 1) centre (38, 1) ccw
  arc A9 (54, 2) -> (55, 3) centre (54, 3) ccw
  line L12 (4, 12) -> (4, 0) construction
  line L13 (4, 12) -> (0, 12) construction
  line L14 (59, 12) -> (59, 0) construction
  line L15 (59, 12) -> (63, 12) construction
  line L16 (9.5, 23) -> (9.5, 24)
  line L17 (11.5, 23) -> (11.5, 24)
  line L18 (26, 23) -> (26, 24)
  line L19 (28, 23) -> (28, 24)
  point P0 (63, 0)
  point P1 (0, 24)
  point P2 (8, 2)
  point P3 (55, 2)
  point P4 (25, 2)
  point P5 (37, 2)
  dimension "d1_1" = 24
  dimension "d2_1" = 63
  dimension "d4_1" = 1
  dimension "d5_1" = 1
  dimension "d22_2" = 5
  dimension "d36_1" = 1
  dimension "d37_1" = 5
  dimension "d44_1" = 21
  dimension "d45" = 21
  dimension "d46" = 17
  dimension "d47_1" = 17
  dimension "d48_1" = 1
  dimension "d55_2" = 12
  dimension "d56_1" = 4
  dimension "d57" = 22
  dimension "d58" = 4
  dimension "d59" = 12
  dimension "d60" = 1
  dimension "d67" = 9.5
  dimension "d71" = 2
  dimension "d72" = 14.5
  dimension "d73" = 2
extrude "Extrude11" add sketch "Bottom (4)" along normal blind 1 separate body makes body 4 in component "PCB Bottom"
extrude "Extrude12" add sketch "Bottom (4)" along normal blind 5 contours L0 A0 A1 L1 L2 L3 L6 L9 L11 A8 A9 L19 | L2 L3 L18 L19 | L1 L2 L3 L4 A3 A4 L5 L7 L10 A6 A7 L16 | L2 L3 L17 L18 | L2 L3 L16 L17 bodies 4 in component "PCB Bottom"
extrude "Extrude13" cut sketch "Bottom (4)" against normal blind 3 from surface at 5 contours L2 L3 L18 L19 | L2 L3 L16 L17 bodies 4 in component "PCB Bottom"
component "Coil Case" placed x (0, 0, 1) y (-1, 0, 0) z (0, -1, 0) at (11.3814, 19.8844, 8.503)
component "Coil Top" placed x (0, 0, 1) y (0, 1, 0) z (-1, 0, 0) at (-0.6186, 14.8844, -15.0621)
component "PCB Top" placed x (0, 0, -1) y (0, -1, 0) z (-1, 0, 0) at (-12.6186, 34.8844, 43.9379)
component "PCB Bottom" placed x (0, 0, -1) y (0, 1, 0) z (1, 0, 0) at (11.3814, 19.8844, 43.9379)
equation "d22 = d4"
